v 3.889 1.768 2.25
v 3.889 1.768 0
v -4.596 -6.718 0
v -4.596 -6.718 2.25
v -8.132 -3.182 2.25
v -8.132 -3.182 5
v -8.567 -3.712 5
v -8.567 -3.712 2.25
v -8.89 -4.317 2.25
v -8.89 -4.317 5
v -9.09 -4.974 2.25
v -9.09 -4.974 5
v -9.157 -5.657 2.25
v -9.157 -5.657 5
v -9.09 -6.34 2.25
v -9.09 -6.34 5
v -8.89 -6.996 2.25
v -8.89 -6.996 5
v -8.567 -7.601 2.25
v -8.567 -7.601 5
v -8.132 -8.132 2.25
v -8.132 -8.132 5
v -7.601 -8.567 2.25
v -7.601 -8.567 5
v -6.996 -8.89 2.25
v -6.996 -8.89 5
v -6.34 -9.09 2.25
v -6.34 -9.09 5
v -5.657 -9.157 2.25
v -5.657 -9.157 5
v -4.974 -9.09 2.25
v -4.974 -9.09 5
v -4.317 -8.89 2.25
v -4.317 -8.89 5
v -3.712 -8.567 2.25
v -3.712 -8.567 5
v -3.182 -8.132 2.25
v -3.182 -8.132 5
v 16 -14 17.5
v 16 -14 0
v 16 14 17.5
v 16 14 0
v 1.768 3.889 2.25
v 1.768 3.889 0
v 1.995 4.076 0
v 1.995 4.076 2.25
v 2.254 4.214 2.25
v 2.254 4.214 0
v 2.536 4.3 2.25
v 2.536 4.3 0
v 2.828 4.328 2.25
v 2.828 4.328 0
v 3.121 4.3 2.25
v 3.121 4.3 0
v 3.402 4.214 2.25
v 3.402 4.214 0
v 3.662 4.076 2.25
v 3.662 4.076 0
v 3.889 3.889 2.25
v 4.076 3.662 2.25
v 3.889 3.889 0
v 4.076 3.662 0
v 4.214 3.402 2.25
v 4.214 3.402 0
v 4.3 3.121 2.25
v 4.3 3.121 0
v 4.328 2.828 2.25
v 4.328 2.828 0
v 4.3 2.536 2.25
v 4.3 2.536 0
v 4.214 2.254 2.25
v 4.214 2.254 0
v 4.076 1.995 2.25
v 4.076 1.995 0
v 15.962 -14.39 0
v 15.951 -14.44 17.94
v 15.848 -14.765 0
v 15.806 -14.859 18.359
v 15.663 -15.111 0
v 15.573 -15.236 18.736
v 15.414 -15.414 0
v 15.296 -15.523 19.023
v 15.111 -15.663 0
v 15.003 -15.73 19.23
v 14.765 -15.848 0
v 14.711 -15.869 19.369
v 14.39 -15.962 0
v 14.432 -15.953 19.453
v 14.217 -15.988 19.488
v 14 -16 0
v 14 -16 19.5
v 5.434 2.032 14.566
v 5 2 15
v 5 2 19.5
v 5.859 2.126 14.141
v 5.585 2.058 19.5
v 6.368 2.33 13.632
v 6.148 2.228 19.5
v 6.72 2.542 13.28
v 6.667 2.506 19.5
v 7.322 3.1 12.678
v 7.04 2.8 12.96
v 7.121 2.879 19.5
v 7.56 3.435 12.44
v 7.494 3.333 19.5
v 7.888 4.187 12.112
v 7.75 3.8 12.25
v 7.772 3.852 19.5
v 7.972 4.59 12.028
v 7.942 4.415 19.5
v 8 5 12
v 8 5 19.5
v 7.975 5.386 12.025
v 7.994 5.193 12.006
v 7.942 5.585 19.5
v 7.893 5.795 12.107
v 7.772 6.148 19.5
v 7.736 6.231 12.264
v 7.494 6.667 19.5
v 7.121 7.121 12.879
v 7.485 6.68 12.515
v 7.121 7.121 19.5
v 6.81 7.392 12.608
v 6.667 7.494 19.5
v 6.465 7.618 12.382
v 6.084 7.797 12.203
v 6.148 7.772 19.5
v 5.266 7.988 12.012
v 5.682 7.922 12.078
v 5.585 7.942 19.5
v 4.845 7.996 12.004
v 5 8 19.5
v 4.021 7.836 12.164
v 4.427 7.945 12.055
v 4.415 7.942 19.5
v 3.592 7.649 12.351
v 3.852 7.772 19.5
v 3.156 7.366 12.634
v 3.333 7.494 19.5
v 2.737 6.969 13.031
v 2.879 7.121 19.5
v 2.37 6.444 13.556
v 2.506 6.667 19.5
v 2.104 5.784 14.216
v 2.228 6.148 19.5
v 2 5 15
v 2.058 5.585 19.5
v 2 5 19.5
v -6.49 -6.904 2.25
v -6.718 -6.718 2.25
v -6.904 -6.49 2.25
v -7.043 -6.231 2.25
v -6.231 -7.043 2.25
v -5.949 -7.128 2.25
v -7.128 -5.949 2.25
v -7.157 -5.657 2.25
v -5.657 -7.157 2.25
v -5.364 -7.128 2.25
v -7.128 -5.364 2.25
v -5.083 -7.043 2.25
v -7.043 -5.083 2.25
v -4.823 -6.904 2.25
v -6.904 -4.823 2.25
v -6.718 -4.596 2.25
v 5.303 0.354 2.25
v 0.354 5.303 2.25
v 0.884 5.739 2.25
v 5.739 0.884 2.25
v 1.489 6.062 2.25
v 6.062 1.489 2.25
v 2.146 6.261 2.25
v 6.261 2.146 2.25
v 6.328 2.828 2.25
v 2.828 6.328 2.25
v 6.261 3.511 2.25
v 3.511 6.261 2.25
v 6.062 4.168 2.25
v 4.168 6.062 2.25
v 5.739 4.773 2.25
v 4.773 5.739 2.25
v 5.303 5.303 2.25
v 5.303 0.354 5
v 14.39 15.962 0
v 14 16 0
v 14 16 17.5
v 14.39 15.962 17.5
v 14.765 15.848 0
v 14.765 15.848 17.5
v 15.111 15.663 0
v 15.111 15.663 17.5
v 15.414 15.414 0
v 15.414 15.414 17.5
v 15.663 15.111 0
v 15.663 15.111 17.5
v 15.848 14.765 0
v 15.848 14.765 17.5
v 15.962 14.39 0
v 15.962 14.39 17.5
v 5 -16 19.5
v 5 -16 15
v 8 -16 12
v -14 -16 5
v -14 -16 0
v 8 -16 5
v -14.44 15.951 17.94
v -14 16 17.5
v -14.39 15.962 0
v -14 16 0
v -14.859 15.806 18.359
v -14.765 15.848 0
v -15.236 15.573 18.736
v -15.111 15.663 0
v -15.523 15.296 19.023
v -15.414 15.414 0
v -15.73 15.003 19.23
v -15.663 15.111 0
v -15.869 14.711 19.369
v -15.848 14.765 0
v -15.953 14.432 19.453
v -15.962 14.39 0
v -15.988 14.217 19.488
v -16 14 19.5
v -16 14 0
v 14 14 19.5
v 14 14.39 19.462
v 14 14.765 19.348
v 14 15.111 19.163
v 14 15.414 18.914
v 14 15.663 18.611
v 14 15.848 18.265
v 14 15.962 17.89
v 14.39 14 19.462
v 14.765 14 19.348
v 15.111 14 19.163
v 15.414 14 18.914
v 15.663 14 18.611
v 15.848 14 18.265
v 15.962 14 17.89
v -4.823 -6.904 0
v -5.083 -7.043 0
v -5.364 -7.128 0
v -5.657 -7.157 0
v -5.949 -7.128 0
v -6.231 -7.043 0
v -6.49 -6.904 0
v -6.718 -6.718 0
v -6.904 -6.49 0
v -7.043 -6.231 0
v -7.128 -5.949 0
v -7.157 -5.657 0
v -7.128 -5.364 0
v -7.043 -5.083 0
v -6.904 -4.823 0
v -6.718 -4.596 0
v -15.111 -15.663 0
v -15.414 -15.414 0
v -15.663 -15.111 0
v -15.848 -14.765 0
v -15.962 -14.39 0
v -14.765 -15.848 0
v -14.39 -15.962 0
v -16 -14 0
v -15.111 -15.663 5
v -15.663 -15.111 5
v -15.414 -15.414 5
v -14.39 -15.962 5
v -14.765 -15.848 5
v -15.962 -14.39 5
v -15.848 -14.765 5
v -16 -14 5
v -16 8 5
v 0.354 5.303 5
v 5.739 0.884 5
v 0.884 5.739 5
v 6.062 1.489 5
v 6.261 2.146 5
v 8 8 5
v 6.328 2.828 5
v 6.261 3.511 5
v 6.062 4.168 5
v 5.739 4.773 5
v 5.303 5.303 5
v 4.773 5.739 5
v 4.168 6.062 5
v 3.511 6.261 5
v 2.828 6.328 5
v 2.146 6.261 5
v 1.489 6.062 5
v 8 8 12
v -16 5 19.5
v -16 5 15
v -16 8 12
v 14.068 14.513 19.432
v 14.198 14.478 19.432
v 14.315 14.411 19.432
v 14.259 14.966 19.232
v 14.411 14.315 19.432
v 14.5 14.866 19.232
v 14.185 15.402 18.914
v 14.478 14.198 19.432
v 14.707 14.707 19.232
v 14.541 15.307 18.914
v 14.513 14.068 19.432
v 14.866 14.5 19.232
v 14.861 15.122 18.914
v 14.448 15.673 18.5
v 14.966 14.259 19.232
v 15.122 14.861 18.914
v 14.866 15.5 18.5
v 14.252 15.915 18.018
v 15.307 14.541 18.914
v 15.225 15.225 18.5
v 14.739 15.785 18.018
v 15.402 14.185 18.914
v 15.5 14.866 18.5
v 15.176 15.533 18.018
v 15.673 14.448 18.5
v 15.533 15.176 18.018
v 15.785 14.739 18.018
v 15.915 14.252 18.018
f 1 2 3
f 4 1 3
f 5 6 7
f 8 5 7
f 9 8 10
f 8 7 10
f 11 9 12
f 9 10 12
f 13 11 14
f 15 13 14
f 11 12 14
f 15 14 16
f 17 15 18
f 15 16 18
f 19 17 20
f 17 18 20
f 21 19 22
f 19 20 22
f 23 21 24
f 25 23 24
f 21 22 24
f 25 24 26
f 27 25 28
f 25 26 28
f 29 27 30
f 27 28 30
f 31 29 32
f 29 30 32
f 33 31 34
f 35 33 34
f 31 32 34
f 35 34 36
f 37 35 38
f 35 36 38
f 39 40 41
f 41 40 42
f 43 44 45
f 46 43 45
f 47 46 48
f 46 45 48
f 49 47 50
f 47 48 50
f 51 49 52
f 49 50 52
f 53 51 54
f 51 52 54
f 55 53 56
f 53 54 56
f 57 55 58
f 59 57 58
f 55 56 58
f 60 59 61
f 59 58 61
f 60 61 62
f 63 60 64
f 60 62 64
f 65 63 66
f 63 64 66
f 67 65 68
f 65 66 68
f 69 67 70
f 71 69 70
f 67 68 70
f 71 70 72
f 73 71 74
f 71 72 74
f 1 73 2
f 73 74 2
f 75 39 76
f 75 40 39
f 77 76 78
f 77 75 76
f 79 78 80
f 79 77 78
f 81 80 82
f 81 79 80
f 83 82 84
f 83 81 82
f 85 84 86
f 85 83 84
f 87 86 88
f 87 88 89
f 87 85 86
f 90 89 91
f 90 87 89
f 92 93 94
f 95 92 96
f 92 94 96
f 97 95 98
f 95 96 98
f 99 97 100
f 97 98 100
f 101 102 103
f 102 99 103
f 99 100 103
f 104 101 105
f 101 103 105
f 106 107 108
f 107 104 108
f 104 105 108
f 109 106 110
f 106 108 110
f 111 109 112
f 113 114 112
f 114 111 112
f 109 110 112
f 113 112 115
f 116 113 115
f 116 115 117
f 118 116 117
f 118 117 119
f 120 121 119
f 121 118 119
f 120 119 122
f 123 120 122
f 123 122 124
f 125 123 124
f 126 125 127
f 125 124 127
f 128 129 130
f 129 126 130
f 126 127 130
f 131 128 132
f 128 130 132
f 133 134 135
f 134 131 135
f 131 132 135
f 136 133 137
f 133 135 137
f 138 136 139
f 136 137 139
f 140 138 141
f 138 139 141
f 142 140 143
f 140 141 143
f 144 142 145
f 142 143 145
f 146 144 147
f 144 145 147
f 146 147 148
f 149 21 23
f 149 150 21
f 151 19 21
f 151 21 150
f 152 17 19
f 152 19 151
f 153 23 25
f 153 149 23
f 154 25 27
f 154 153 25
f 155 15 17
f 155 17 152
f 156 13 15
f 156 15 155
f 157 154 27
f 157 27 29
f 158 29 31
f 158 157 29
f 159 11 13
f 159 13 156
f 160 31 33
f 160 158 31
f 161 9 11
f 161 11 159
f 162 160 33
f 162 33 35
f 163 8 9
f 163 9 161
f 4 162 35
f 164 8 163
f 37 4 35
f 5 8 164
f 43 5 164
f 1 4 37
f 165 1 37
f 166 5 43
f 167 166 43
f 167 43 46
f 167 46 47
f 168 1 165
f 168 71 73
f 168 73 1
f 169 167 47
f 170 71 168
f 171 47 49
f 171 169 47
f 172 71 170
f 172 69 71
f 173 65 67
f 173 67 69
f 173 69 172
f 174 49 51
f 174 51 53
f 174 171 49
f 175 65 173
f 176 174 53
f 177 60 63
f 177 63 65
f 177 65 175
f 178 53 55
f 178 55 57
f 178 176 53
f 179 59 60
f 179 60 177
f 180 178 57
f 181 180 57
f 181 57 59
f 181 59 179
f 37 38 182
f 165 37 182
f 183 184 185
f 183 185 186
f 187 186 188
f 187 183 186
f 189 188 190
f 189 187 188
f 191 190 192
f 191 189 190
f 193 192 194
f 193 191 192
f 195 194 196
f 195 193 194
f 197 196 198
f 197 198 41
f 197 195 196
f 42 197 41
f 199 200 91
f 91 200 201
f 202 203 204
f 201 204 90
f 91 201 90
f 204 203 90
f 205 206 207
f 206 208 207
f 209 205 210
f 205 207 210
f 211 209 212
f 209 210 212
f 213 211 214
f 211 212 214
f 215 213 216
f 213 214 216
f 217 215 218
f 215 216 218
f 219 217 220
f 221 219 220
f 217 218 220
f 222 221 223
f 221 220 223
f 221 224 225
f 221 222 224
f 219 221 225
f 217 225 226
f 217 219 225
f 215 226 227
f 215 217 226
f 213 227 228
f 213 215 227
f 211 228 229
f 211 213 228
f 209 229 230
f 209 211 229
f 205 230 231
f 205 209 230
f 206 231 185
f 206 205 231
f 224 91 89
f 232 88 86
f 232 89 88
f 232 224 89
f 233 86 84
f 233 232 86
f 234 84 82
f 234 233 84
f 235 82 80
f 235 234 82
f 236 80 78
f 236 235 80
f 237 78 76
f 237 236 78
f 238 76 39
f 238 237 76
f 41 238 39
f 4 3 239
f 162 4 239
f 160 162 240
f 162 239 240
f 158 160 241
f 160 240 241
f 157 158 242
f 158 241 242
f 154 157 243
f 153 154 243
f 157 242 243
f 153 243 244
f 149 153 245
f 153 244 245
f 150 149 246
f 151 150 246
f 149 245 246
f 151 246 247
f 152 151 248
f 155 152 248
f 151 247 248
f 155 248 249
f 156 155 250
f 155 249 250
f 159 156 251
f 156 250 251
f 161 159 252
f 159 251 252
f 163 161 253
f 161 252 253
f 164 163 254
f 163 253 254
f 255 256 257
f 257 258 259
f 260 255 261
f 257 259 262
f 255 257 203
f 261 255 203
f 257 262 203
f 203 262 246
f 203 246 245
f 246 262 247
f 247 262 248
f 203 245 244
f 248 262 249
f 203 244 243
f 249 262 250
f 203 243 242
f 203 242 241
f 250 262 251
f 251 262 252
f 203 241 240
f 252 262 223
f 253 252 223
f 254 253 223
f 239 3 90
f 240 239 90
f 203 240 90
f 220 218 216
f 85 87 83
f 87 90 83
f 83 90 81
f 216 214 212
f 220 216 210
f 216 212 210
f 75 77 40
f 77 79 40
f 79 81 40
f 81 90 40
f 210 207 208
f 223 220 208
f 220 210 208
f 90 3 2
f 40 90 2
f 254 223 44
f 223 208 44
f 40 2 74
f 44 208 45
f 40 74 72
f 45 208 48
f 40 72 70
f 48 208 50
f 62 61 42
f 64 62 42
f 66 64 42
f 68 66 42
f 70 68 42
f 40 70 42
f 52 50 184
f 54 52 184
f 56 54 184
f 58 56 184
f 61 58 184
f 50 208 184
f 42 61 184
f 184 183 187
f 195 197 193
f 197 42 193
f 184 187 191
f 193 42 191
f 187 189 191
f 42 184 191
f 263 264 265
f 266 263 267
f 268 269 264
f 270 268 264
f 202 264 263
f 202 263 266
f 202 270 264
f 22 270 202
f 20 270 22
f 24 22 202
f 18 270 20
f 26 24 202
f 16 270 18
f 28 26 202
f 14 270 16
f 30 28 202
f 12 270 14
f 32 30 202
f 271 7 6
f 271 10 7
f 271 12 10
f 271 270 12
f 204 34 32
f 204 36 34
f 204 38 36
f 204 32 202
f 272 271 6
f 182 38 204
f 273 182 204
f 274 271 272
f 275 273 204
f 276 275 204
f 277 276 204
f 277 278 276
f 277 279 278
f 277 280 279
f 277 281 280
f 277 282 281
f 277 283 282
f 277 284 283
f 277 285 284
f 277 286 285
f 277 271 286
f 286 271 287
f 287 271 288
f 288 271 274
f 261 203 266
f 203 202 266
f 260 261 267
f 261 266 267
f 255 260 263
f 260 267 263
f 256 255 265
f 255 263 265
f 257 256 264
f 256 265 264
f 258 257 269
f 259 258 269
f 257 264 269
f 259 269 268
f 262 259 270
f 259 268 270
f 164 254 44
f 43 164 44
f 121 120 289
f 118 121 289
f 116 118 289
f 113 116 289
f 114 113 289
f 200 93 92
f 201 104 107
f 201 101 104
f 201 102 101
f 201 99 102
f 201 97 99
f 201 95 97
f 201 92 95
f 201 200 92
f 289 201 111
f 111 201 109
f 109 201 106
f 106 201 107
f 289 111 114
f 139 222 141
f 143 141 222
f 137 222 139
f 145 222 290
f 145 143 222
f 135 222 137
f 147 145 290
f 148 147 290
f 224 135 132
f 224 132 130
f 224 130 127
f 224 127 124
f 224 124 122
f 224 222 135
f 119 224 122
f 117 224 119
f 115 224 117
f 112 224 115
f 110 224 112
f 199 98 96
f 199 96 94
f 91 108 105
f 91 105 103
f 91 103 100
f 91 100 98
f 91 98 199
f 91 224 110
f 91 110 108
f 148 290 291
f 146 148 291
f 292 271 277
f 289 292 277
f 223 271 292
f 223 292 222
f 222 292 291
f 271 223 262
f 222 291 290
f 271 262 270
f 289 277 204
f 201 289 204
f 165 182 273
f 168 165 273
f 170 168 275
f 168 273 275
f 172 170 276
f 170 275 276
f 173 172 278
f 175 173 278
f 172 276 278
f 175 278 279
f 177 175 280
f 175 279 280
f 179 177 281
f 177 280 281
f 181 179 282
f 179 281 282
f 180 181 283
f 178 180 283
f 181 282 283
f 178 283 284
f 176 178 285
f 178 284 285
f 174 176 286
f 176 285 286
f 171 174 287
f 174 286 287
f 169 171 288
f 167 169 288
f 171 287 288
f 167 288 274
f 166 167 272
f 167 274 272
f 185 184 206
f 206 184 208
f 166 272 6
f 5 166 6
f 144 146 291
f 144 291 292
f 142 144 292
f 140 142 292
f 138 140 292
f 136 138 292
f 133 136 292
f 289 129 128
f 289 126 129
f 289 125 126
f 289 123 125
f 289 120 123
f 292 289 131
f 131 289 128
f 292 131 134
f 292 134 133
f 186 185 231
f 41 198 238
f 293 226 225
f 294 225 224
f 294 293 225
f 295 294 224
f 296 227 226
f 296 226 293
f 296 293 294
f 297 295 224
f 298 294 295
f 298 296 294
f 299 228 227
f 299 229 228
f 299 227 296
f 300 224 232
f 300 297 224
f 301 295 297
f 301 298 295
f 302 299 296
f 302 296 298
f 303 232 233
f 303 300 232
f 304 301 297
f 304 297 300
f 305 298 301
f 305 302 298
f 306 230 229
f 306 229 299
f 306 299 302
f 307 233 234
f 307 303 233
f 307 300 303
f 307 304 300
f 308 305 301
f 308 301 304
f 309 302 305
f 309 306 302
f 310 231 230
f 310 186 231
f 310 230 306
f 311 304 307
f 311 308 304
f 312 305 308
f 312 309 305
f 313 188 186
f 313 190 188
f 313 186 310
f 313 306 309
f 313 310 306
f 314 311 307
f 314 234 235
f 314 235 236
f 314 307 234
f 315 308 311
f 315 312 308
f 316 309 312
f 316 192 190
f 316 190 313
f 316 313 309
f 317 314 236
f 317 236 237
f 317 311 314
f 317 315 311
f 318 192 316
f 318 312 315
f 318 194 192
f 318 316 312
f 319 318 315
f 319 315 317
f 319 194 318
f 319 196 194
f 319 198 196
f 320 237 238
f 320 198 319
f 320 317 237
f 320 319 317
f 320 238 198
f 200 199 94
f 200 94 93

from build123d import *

# Parameters (mm, degrees)
F0_W     = 32
F0_H     = 32
F1_DEPTH = 5
F3_DEPTH = 14.5
F4_DEPTH = 2.75
F7_R     = 2.9999901718
F8_DEPTH = 14
F9_R     = 2


with BuildPart() as f1:
    # F0 (on Top) → F1 (new body)
    with BuildSketch(Plane.XY):
        Rectangle(F0_W, F0_H)
        with BuildLine():
            ThreePointArc((-4.5961940777, -6.7175144213), (-6.7175144213, -6.7175144213), (-6.7175144213, -4.5961940777))
            Line((-6.7175144213, -4.5961940777), (1.767766953, 3.8890872965))
            ThreePointArc((1.767766953, 3.8890872965), (3.8890872965, 3.8890872965), (3.8890872965, 1.767766953))
            Line((3.8890872965, 1.767766953), (-4.5961940777, -6.7175144213))
        make_face(mode=Mode.SUBTRACT)
    extrude(amount=F1_DEPTH)

    # F2 (on face) → F3 (join)
    with BuildSketch(Plane.XY.offset(5)):
        Polygon((-16, 16), (-16, 8), (8, 8), (8, -16), (16, -16), (16, 16), align=None)
    extrude(amount=F3_DEPTH)

    # F2 (on face) → F4 (cut)
    with BuildSketch(Plane.XY.offset(5)):
        with BuildLine():
            Line((0.3535533906, 5.3033008589), (-8.1317279836, -3.1819805153))
            ThreePointArc((-8.1317279836, -3.1819805153), (-8.1317279836, -8.1317279836), (-3.1819805153, -8.1317279836))
            Line((-3.1819805153, -8.1317279836), (5.3033008589, 0.3535533906))
            ThreePointArc((5.3033008589, 0.3535533906), (5.3033008589, 5.3033008589), (0.3535533906, 5.3033008589))
        make_face()
        with BuildLine():
            Line((-6.7175144213, -4.5961940777), (1.767766953, 3.8890872965))
            ThreePointArc((1.767766953, 3.8890872965), (3.8890872965, 3.8890872965), (3.8890872965, 1.767766953))
            Line((3.8890872965, 1.767766953), (-4.5961940777, -6.7175144213))
            ThreePointArc((-4.5961940777, -6.7175144213), (-6.7175144213, -6.7175144213), (-6.7175144213, -4.5961940777))
        make_face(mode=Mode.SUBTRACT)
    extrude(amount=-F4_DEPTH, mode=Mode.SUBTRACT)

    # F6: sweep along a path in F6_path
    with BuildLine(Plane(origin=(8, 8, 19.5), x_dir=(0, 1, 0), z_dir=(0, 0, 1))) as f6_path:
        Line((0, 24), (0, 0))
        Line((0, 0), (-24, 0))
    # F5 (on face) → F6 (sweep)
    with BuildSketch(Plane.XZ.offset(16)):
        Polygon((8, 12), (8, 19.5), (5, 19.5), (5, 15), align=None)
    sweep(path=f6_path.line, transition=Transition.RIGHT)

    # F7 (on face) → F8 (cut)
    with BuildSketch(Plane.XY.offset(19.5)):
        with Locations((5, 5)):
            Circle(F7_R)
    extrude(amount=-F8_DEPTH, mode=Mode.SUBTRACT)

    # F9
    f9_edges = [f1.edges().sort_by_distance(p)[0] for p in [
        (16, -16, 9.75),
        (16, 16, 9.75),
        (-16, 16, 9.75),
        (0, 16, 19.5),
        (16, 0, 19.5),
        (-16, -16, 2.5),
    ]]
    fillet(f9_edges, radius=F9_R)


solid = f1.part
